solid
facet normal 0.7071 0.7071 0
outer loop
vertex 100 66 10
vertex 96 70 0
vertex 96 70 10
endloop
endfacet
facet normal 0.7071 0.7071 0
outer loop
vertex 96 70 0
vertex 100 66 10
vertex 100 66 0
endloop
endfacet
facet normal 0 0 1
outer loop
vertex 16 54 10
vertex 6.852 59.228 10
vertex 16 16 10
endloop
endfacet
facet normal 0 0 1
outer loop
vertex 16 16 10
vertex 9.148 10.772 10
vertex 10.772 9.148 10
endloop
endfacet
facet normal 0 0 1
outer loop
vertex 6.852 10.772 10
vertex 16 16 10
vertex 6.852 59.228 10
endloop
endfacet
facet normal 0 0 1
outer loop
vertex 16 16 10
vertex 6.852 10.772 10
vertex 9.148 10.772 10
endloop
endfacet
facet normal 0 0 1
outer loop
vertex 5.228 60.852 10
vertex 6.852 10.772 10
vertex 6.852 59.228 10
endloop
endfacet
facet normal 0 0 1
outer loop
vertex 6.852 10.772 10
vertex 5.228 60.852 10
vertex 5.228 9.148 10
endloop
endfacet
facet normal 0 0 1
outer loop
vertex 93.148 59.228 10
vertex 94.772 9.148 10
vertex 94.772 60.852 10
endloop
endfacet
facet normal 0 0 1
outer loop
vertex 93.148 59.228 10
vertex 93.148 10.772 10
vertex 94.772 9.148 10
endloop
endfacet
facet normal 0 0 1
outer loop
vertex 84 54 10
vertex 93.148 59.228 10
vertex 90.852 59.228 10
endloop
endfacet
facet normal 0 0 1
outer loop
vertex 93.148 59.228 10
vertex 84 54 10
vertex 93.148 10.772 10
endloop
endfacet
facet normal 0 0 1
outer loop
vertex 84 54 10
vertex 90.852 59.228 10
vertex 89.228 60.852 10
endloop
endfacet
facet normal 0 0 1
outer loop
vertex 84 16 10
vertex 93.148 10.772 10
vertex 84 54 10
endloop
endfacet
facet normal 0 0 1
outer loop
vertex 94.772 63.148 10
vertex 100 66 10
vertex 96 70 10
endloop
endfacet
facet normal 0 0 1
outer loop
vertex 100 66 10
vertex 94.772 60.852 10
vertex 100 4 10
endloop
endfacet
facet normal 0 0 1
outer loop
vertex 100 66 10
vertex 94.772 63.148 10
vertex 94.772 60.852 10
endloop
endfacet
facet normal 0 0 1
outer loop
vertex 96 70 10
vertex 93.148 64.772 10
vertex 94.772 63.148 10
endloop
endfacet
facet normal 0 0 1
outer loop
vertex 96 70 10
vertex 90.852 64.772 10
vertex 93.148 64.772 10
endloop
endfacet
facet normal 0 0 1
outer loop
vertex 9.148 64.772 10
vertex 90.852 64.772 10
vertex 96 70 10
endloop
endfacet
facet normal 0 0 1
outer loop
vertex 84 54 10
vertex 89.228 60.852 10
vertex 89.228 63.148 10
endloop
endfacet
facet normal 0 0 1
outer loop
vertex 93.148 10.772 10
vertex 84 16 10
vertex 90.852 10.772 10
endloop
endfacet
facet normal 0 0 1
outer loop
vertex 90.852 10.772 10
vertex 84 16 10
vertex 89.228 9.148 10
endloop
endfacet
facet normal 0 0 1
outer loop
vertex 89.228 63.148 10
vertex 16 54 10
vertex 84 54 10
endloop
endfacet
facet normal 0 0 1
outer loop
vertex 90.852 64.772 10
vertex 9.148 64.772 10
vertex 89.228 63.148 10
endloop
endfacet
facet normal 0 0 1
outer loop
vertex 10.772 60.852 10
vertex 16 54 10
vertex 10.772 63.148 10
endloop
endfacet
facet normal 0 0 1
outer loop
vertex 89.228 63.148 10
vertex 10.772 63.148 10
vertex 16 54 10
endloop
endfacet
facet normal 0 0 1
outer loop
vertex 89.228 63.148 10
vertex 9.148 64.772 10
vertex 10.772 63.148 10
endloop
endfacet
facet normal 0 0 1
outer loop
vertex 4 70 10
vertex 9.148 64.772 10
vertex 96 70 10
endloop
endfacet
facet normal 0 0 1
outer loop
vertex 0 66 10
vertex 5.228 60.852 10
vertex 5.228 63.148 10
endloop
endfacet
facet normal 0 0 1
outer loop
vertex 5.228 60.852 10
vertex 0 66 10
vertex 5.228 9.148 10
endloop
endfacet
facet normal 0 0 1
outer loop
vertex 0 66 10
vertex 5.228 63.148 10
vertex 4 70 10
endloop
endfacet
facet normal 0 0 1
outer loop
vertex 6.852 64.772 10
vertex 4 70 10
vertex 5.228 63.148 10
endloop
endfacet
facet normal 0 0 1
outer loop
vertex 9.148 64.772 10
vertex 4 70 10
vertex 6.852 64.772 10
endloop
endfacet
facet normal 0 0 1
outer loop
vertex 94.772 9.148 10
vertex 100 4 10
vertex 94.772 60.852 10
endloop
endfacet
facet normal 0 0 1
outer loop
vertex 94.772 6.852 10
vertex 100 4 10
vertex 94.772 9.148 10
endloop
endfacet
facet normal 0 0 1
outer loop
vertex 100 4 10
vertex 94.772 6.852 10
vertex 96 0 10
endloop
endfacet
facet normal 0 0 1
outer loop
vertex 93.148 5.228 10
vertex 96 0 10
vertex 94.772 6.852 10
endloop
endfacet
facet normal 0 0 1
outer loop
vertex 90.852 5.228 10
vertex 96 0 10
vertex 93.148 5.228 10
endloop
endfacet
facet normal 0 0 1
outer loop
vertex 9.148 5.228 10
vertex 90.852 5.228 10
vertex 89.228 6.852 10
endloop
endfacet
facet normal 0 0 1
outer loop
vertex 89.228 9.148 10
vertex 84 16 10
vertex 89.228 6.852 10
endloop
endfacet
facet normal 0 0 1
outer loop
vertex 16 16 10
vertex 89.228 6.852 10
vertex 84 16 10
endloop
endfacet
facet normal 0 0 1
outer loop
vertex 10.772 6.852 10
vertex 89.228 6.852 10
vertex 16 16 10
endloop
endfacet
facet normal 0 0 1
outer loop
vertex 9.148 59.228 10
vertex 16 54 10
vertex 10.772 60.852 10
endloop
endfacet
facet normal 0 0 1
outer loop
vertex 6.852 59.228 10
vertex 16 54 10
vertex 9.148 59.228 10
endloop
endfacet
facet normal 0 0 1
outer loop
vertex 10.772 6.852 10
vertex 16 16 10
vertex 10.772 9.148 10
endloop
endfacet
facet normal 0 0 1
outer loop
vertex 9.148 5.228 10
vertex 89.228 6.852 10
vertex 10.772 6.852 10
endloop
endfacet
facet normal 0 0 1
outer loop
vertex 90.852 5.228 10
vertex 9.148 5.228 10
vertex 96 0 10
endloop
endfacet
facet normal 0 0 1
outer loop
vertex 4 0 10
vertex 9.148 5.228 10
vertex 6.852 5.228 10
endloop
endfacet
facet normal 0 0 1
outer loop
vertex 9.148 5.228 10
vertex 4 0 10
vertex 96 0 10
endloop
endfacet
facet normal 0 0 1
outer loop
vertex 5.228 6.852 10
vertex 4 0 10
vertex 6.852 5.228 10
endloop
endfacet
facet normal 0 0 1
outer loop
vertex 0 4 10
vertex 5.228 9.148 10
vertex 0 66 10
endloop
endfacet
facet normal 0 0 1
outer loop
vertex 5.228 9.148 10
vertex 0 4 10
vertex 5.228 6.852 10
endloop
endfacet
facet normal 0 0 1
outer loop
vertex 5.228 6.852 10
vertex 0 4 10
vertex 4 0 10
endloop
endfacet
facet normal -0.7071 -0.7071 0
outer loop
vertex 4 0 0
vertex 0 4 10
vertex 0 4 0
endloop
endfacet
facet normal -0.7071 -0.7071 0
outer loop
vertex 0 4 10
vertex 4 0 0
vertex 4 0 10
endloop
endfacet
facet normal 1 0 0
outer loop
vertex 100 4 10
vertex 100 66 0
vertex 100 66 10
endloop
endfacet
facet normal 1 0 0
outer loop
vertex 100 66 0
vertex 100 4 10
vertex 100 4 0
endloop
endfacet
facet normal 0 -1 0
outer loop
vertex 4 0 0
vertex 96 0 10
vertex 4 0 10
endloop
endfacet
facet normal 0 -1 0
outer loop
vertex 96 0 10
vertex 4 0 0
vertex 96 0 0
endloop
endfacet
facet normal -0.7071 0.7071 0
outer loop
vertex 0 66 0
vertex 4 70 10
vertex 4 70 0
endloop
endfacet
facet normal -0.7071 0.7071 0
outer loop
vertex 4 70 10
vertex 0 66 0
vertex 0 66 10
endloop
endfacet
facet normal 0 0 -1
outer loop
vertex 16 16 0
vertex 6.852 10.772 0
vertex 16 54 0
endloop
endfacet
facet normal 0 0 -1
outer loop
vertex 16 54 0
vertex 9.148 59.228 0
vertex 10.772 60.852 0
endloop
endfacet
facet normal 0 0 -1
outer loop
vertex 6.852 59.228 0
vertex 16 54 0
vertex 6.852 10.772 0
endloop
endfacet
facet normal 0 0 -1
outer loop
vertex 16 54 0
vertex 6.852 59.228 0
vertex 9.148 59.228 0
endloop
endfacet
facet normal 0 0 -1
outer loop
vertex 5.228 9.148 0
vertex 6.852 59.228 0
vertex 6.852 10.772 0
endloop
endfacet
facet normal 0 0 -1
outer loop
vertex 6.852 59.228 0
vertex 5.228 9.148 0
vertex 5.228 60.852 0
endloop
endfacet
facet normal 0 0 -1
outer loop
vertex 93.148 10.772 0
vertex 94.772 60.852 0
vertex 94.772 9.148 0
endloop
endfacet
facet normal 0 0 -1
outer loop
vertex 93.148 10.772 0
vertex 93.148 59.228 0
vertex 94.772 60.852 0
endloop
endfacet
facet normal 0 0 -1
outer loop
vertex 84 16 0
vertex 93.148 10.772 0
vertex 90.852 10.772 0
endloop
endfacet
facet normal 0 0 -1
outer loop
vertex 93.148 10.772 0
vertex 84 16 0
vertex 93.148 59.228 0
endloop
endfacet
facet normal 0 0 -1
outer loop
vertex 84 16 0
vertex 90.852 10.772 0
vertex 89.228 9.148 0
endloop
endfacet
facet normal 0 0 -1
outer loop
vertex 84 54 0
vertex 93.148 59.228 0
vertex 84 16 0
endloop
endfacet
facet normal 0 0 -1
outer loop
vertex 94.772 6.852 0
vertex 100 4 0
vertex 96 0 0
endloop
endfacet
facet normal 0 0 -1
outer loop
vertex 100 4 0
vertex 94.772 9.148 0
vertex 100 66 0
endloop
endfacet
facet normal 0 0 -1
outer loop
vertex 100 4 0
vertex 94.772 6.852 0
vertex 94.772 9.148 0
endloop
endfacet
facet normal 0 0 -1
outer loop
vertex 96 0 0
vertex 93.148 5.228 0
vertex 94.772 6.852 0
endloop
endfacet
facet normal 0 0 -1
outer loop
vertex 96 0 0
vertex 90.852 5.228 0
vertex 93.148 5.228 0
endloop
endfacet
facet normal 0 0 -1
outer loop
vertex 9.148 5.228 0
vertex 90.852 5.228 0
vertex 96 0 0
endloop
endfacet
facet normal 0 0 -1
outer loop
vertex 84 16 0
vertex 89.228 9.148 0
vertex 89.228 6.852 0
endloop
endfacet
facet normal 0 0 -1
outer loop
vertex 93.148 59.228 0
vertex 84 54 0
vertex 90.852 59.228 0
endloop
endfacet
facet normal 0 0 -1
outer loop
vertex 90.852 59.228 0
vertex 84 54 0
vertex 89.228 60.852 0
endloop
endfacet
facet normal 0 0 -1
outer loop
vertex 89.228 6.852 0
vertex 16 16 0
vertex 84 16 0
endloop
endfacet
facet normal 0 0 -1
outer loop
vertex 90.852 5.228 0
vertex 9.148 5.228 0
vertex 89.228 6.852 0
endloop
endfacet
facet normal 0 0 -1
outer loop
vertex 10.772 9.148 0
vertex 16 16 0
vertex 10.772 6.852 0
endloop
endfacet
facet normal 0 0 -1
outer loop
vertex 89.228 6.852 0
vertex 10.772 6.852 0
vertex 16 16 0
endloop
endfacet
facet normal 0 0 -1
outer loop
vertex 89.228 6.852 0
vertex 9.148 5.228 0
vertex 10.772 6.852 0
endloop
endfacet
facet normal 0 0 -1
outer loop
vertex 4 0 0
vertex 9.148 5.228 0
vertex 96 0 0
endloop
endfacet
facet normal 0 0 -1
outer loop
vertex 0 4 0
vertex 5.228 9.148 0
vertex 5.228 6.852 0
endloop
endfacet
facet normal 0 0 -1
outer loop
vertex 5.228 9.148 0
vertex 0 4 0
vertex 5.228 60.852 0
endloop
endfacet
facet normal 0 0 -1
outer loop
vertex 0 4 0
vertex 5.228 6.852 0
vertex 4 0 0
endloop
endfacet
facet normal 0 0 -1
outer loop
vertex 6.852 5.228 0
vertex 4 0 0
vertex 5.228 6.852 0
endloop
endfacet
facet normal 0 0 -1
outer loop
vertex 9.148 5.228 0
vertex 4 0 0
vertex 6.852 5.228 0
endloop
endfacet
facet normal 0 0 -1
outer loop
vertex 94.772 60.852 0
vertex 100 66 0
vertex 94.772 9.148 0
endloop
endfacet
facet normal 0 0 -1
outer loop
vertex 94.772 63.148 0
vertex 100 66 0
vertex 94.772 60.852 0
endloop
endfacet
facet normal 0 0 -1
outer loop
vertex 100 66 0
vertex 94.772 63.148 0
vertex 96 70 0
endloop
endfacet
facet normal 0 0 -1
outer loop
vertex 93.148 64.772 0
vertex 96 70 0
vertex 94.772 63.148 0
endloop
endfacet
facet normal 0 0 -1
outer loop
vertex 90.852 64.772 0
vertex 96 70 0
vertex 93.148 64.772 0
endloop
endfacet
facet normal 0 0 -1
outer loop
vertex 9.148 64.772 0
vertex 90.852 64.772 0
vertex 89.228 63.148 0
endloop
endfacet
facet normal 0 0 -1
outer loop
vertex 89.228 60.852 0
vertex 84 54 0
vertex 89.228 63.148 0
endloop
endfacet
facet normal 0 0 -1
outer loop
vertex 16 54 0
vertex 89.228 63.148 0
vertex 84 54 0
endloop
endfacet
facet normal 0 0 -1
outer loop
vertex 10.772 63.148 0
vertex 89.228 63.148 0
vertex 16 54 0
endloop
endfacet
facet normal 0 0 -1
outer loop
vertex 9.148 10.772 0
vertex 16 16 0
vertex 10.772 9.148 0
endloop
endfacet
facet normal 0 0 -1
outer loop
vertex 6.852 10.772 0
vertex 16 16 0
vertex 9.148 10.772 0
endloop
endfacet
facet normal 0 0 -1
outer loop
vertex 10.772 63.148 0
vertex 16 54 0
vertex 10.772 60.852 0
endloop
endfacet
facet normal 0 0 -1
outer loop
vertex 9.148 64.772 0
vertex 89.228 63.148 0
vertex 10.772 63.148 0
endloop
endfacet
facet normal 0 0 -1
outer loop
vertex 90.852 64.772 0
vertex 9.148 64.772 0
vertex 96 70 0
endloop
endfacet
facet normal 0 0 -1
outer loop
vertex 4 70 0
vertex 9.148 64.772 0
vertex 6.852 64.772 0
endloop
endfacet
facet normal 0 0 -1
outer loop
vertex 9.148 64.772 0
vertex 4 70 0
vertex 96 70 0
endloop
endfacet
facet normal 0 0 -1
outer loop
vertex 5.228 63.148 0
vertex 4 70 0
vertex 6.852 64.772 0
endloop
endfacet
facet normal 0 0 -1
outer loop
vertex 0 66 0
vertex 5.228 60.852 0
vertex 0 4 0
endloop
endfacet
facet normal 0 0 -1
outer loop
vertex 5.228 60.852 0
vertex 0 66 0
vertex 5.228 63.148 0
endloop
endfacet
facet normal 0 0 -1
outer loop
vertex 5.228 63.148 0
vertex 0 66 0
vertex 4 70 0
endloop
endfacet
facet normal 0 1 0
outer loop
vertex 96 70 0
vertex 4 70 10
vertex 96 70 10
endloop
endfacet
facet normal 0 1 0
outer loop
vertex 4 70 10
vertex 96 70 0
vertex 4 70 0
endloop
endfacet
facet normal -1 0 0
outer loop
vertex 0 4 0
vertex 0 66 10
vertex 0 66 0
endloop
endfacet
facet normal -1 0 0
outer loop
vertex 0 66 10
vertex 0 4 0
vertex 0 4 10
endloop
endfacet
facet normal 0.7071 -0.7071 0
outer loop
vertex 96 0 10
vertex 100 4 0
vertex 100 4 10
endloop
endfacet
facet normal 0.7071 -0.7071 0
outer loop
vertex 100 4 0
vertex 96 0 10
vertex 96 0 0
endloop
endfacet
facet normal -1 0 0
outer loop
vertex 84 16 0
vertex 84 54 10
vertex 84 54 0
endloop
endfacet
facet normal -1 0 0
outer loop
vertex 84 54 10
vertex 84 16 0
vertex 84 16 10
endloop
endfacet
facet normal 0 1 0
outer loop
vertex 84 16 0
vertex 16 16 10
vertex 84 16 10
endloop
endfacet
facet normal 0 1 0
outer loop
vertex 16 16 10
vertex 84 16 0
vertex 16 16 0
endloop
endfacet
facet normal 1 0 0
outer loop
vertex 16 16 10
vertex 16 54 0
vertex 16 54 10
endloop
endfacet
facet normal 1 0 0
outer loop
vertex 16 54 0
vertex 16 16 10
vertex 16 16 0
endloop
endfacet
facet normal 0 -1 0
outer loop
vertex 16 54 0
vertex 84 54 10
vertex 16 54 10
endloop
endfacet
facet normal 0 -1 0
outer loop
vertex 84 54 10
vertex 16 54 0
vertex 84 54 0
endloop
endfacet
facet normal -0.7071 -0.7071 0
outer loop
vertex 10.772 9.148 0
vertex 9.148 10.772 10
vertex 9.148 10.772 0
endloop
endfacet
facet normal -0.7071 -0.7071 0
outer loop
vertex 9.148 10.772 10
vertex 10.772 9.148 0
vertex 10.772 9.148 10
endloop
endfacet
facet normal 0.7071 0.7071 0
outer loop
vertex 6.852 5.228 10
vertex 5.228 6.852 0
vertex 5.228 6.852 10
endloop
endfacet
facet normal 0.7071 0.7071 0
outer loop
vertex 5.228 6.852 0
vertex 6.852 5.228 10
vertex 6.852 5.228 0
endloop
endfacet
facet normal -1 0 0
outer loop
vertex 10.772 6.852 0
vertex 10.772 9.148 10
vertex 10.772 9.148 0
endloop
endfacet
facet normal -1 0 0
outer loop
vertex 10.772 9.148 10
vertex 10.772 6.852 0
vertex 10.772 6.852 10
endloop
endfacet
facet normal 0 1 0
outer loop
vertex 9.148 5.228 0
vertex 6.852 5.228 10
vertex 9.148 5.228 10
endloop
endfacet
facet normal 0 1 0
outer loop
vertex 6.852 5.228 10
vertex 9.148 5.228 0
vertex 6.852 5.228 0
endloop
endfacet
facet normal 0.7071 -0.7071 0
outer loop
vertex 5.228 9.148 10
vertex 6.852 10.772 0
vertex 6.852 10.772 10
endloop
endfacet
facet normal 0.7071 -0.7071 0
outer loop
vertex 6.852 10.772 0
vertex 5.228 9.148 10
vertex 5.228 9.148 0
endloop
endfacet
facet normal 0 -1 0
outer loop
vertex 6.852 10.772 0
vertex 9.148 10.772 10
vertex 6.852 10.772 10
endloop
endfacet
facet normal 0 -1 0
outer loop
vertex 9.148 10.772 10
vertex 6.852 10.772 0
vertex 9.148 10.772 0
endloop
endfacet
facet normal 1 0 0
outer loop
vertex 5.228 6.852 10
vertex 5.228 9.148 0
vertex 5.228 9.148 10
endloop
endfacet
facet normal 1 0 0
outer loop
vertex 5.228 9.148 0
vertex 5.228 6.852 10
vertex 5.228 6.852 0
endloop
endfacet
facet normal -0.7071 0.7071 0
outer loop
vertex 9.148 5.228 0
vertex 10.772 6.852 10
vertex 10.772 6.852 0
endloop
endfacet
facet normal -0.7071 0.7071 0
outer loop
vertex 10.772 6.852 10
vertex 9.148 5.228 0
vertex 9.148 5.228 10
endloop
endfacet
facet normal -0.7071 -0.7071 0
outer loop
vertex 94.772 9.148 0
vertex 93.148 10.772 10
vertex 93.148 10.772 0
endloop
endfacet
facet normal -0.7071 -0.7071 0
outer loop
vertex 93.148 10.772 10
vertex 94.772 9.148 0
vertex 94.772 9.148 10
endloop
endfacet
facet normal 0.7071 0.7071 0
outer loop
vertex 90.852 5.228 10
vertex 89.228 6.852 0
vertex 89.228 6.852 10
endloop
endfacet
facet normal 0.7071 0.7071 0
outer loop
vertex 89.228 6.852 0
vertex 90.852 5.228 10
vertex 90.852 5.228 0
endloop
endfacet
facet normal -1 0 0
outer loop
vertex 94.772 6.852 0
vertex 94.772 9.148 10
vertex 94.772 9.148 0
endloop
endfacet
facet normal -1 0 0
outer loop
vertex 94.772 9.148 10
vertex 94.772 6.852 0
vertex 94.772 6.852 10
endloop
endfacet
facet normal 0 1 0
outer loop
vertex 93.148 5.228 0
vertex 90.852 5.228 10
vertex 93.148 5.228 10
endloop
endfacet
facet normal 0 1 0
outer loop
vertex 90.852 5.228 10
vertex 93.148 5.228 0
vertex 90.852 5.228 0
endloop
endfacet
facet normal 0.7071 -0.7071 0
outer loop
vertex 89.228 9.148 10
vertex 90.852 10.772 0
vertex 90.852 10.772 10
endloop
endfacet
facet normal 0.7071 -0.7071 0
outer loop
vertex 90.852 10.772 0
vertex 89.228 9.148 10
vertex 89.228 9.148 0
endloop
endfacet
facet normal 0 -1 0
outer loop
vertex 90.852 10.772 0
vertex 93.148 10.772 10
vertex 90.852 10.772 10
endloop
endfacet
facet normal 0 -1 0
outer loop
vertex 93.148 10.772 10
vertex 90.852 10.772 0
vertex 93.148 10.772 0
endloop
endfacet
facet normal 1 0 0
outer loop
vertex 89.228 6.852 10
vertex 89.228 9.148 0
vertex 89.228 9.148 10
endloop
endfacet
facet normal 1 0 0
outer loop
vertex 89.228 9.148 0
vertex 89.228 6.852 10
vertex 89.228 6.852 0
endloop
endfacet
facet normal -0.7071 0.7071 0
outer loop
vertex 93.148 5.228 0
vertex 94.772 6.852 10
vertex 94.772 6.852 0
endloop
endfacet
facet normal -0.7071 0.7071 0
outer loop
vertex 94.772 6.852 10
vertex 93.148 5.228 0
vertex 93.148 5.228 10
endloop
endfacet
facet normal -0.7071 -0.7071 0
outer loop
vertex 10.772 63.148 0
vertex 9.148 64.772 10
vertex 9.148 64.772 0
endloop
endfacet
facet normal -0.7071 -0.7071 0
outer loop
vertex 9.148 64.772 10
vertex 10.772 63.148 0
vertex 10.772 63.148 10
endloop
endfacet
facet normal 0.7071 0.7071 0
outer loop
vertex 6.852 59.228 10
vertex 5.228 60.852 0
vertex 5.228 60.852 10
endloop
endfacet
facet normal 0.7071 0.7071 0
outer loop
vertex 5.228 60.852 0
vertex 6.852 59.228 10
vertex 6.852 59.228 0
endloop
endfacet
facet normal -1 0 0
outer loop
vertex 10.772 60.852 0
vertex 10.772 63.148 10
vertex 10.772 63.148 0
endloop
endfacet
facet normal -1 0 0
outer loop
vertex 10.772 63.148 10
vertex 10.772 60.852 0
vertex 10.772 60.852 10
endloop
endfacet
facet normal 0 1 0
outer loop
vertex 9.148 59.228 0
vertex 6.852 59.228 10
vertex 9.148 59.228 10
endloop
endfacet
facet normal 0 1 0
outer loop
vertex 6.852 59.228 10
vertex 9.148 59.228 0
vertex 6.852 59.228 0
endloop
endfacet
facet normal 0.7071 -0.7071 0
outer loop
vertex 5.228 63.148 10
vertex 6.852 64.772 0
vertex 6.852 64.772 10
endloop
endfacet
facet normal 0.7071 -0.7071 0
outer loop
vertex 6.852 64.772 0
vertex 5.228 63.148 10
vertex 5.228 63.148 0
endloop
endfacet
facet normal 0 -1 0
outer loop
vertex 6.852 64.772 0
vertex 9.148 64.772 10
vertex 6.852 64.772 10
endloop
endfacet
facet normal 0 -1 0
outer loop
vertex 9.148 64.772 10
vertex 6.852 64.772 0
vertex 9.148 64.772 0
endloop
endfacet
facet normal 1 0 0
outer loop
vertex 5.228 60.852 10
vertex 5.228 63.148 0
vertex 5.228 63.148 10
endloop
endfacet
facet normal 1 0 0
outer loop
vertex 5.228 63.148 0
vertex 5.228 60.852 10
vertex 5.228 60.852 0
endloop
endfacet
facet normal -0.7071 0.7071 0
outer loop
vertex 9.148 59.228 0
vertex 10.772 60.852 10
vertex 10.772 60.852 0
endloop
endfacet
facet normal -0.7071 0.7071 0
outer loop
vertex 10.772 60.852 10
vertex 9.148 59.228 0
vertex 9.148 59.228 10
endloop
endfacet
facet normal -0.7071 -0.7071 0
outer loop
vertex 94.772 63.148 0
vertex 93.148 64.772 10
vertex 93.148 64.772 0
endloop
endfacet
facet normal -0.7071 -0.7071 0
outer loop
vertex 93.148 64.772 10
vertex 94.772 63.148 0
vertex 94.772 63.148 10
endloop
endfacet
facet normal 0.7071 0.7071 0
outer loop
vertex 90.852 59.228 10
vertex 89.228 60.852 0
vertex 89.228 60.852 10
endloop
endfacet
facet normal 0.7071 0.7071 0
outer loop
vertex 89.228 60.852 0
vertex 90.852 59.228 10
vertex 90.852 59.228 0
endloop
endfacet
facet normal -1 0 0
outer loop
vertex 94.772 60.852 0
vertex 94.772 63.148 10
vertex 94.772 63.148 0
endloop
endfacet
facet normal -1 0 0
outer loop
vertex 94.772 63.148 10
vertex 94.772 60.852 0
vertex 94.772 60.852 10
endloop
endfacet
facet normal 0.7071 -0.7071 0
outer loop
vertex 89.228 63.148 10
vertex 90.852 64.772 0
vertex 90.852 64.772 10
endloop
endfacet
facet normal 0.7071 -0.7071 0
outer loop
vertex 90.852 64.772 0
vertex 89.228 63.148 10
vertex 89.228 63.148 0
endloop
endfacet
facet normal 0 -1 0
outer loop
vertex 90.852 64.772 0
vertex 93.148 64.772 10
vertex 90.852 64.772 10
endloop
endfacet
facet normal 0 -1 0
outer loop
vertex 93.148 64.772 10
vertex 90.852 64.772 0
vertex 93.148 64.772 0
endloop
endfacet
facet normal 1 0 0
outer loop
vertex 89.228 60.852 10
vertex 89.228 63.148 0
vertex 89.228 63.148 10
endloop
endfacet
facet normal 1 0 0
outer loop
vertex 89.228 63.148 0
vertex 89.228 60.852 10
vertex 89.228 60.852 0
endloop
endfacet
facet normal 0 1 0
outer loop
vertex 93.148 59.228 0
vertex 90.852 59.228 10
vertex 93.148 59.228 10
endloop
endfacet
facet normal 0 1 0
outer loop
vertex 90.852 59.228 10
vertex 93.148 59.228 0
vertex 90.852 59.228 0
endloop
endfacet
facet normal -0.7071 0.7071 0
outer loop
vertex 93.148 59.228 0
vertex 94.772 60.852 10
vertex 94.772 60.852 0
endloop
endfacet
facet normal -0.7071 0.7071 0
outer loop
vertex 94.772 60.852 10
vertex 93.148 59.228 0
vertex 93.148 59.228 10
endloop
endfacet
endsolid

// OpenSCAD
$fn = 32;

// ----------------------------------------------------------------------
// Frame plate: 100 x 70 frame, 16 mm rails
// ----------------------------------------------------------------------

// --- parameters (mm) ---
plate_l = 100;            // plate length, X
plate_w = 70;             // plate width, Y
plate_t = 10;             // plate thickness, Z (extrusion height)
corner_c = 4;             // corner chamfer
frame_bar = 16;           // frame rail width
bolt_r = 3;               // corner bolt window radius
bolt_inset = 8;           // bolt centre inset from the edges

win_l = plate_l - 2 * frame_bar;  // window length
win_w = plate_w - 2 * frame_bar;  // window width
bolt_d = 2 * bolt_r;  // corner hole diameter

profile = [[4, 0], [96, 0], [100, 4], [100, 66], [96, 70], [4, 70], [0, 66], [0, 4]];  // primary outline, 8 points, counter clockwise
void_1 = [[16, 16], [84, 16], [84, 54], [16, 54]];  // the window, 4 points
void_2 = [[10.772, 9.148], [9.148, 10.772], [6.852, 10.772], [5.228, 9.148], [5.228, 6.852], [6.852, 5.228], [9.148, 5.228], [10.772, 6.852]];  // corner bolt window, 8 points
void_3 = [[94.772, 9.148], [93.148, 10.772], [90.852, 10.772], [89.228, 9.148], [89.228, 6.852], [90.852, 5.228], [93.148, 5.228], [94.772, 6.852]];  // corner bolt window, 8 points
void_4 = [[10.772, 63.148], [9.148, 64.772], [6.852, 64.772], [5.228, 63.148], [5.228, 60.852], [6.852, 59.228], [9.148, 59.228], [10.772, 60.852]];  // corner bolt window, 8 points
void_5 = [[94.772, 63.148], [93.148, 64.772], [90.852, 64.772], [89.228, 63.148], [89.228, 60.852], [90.852, 59.228], [93.148, 59.228], [94.772, 60.852]];  // corner bolt window, 8 points

// --- the one profile operation ---
difference() {
  linear_extrude(height = plate_t) polygon(points = profile);
  translate([0, 0, -1])
    linear_extrude(height = plate_t + 2) polygon(points = void_1);
  translate([0, 0, -1])
    linear_extrude(height = plate_t + 2) polygon(points = void_2);
  translate([0, 0, -1])
    linear_extrude(height = plate_t + 2) polygon(points = void_3);
  translate([0, 0, -1])
    linear_extrude(height = plate_t + 2) polygon(points = void_4);
  translate([0, 0, -1])
    linear_extrude(height = plate_t + 2) polygon(points = void_5);
}
